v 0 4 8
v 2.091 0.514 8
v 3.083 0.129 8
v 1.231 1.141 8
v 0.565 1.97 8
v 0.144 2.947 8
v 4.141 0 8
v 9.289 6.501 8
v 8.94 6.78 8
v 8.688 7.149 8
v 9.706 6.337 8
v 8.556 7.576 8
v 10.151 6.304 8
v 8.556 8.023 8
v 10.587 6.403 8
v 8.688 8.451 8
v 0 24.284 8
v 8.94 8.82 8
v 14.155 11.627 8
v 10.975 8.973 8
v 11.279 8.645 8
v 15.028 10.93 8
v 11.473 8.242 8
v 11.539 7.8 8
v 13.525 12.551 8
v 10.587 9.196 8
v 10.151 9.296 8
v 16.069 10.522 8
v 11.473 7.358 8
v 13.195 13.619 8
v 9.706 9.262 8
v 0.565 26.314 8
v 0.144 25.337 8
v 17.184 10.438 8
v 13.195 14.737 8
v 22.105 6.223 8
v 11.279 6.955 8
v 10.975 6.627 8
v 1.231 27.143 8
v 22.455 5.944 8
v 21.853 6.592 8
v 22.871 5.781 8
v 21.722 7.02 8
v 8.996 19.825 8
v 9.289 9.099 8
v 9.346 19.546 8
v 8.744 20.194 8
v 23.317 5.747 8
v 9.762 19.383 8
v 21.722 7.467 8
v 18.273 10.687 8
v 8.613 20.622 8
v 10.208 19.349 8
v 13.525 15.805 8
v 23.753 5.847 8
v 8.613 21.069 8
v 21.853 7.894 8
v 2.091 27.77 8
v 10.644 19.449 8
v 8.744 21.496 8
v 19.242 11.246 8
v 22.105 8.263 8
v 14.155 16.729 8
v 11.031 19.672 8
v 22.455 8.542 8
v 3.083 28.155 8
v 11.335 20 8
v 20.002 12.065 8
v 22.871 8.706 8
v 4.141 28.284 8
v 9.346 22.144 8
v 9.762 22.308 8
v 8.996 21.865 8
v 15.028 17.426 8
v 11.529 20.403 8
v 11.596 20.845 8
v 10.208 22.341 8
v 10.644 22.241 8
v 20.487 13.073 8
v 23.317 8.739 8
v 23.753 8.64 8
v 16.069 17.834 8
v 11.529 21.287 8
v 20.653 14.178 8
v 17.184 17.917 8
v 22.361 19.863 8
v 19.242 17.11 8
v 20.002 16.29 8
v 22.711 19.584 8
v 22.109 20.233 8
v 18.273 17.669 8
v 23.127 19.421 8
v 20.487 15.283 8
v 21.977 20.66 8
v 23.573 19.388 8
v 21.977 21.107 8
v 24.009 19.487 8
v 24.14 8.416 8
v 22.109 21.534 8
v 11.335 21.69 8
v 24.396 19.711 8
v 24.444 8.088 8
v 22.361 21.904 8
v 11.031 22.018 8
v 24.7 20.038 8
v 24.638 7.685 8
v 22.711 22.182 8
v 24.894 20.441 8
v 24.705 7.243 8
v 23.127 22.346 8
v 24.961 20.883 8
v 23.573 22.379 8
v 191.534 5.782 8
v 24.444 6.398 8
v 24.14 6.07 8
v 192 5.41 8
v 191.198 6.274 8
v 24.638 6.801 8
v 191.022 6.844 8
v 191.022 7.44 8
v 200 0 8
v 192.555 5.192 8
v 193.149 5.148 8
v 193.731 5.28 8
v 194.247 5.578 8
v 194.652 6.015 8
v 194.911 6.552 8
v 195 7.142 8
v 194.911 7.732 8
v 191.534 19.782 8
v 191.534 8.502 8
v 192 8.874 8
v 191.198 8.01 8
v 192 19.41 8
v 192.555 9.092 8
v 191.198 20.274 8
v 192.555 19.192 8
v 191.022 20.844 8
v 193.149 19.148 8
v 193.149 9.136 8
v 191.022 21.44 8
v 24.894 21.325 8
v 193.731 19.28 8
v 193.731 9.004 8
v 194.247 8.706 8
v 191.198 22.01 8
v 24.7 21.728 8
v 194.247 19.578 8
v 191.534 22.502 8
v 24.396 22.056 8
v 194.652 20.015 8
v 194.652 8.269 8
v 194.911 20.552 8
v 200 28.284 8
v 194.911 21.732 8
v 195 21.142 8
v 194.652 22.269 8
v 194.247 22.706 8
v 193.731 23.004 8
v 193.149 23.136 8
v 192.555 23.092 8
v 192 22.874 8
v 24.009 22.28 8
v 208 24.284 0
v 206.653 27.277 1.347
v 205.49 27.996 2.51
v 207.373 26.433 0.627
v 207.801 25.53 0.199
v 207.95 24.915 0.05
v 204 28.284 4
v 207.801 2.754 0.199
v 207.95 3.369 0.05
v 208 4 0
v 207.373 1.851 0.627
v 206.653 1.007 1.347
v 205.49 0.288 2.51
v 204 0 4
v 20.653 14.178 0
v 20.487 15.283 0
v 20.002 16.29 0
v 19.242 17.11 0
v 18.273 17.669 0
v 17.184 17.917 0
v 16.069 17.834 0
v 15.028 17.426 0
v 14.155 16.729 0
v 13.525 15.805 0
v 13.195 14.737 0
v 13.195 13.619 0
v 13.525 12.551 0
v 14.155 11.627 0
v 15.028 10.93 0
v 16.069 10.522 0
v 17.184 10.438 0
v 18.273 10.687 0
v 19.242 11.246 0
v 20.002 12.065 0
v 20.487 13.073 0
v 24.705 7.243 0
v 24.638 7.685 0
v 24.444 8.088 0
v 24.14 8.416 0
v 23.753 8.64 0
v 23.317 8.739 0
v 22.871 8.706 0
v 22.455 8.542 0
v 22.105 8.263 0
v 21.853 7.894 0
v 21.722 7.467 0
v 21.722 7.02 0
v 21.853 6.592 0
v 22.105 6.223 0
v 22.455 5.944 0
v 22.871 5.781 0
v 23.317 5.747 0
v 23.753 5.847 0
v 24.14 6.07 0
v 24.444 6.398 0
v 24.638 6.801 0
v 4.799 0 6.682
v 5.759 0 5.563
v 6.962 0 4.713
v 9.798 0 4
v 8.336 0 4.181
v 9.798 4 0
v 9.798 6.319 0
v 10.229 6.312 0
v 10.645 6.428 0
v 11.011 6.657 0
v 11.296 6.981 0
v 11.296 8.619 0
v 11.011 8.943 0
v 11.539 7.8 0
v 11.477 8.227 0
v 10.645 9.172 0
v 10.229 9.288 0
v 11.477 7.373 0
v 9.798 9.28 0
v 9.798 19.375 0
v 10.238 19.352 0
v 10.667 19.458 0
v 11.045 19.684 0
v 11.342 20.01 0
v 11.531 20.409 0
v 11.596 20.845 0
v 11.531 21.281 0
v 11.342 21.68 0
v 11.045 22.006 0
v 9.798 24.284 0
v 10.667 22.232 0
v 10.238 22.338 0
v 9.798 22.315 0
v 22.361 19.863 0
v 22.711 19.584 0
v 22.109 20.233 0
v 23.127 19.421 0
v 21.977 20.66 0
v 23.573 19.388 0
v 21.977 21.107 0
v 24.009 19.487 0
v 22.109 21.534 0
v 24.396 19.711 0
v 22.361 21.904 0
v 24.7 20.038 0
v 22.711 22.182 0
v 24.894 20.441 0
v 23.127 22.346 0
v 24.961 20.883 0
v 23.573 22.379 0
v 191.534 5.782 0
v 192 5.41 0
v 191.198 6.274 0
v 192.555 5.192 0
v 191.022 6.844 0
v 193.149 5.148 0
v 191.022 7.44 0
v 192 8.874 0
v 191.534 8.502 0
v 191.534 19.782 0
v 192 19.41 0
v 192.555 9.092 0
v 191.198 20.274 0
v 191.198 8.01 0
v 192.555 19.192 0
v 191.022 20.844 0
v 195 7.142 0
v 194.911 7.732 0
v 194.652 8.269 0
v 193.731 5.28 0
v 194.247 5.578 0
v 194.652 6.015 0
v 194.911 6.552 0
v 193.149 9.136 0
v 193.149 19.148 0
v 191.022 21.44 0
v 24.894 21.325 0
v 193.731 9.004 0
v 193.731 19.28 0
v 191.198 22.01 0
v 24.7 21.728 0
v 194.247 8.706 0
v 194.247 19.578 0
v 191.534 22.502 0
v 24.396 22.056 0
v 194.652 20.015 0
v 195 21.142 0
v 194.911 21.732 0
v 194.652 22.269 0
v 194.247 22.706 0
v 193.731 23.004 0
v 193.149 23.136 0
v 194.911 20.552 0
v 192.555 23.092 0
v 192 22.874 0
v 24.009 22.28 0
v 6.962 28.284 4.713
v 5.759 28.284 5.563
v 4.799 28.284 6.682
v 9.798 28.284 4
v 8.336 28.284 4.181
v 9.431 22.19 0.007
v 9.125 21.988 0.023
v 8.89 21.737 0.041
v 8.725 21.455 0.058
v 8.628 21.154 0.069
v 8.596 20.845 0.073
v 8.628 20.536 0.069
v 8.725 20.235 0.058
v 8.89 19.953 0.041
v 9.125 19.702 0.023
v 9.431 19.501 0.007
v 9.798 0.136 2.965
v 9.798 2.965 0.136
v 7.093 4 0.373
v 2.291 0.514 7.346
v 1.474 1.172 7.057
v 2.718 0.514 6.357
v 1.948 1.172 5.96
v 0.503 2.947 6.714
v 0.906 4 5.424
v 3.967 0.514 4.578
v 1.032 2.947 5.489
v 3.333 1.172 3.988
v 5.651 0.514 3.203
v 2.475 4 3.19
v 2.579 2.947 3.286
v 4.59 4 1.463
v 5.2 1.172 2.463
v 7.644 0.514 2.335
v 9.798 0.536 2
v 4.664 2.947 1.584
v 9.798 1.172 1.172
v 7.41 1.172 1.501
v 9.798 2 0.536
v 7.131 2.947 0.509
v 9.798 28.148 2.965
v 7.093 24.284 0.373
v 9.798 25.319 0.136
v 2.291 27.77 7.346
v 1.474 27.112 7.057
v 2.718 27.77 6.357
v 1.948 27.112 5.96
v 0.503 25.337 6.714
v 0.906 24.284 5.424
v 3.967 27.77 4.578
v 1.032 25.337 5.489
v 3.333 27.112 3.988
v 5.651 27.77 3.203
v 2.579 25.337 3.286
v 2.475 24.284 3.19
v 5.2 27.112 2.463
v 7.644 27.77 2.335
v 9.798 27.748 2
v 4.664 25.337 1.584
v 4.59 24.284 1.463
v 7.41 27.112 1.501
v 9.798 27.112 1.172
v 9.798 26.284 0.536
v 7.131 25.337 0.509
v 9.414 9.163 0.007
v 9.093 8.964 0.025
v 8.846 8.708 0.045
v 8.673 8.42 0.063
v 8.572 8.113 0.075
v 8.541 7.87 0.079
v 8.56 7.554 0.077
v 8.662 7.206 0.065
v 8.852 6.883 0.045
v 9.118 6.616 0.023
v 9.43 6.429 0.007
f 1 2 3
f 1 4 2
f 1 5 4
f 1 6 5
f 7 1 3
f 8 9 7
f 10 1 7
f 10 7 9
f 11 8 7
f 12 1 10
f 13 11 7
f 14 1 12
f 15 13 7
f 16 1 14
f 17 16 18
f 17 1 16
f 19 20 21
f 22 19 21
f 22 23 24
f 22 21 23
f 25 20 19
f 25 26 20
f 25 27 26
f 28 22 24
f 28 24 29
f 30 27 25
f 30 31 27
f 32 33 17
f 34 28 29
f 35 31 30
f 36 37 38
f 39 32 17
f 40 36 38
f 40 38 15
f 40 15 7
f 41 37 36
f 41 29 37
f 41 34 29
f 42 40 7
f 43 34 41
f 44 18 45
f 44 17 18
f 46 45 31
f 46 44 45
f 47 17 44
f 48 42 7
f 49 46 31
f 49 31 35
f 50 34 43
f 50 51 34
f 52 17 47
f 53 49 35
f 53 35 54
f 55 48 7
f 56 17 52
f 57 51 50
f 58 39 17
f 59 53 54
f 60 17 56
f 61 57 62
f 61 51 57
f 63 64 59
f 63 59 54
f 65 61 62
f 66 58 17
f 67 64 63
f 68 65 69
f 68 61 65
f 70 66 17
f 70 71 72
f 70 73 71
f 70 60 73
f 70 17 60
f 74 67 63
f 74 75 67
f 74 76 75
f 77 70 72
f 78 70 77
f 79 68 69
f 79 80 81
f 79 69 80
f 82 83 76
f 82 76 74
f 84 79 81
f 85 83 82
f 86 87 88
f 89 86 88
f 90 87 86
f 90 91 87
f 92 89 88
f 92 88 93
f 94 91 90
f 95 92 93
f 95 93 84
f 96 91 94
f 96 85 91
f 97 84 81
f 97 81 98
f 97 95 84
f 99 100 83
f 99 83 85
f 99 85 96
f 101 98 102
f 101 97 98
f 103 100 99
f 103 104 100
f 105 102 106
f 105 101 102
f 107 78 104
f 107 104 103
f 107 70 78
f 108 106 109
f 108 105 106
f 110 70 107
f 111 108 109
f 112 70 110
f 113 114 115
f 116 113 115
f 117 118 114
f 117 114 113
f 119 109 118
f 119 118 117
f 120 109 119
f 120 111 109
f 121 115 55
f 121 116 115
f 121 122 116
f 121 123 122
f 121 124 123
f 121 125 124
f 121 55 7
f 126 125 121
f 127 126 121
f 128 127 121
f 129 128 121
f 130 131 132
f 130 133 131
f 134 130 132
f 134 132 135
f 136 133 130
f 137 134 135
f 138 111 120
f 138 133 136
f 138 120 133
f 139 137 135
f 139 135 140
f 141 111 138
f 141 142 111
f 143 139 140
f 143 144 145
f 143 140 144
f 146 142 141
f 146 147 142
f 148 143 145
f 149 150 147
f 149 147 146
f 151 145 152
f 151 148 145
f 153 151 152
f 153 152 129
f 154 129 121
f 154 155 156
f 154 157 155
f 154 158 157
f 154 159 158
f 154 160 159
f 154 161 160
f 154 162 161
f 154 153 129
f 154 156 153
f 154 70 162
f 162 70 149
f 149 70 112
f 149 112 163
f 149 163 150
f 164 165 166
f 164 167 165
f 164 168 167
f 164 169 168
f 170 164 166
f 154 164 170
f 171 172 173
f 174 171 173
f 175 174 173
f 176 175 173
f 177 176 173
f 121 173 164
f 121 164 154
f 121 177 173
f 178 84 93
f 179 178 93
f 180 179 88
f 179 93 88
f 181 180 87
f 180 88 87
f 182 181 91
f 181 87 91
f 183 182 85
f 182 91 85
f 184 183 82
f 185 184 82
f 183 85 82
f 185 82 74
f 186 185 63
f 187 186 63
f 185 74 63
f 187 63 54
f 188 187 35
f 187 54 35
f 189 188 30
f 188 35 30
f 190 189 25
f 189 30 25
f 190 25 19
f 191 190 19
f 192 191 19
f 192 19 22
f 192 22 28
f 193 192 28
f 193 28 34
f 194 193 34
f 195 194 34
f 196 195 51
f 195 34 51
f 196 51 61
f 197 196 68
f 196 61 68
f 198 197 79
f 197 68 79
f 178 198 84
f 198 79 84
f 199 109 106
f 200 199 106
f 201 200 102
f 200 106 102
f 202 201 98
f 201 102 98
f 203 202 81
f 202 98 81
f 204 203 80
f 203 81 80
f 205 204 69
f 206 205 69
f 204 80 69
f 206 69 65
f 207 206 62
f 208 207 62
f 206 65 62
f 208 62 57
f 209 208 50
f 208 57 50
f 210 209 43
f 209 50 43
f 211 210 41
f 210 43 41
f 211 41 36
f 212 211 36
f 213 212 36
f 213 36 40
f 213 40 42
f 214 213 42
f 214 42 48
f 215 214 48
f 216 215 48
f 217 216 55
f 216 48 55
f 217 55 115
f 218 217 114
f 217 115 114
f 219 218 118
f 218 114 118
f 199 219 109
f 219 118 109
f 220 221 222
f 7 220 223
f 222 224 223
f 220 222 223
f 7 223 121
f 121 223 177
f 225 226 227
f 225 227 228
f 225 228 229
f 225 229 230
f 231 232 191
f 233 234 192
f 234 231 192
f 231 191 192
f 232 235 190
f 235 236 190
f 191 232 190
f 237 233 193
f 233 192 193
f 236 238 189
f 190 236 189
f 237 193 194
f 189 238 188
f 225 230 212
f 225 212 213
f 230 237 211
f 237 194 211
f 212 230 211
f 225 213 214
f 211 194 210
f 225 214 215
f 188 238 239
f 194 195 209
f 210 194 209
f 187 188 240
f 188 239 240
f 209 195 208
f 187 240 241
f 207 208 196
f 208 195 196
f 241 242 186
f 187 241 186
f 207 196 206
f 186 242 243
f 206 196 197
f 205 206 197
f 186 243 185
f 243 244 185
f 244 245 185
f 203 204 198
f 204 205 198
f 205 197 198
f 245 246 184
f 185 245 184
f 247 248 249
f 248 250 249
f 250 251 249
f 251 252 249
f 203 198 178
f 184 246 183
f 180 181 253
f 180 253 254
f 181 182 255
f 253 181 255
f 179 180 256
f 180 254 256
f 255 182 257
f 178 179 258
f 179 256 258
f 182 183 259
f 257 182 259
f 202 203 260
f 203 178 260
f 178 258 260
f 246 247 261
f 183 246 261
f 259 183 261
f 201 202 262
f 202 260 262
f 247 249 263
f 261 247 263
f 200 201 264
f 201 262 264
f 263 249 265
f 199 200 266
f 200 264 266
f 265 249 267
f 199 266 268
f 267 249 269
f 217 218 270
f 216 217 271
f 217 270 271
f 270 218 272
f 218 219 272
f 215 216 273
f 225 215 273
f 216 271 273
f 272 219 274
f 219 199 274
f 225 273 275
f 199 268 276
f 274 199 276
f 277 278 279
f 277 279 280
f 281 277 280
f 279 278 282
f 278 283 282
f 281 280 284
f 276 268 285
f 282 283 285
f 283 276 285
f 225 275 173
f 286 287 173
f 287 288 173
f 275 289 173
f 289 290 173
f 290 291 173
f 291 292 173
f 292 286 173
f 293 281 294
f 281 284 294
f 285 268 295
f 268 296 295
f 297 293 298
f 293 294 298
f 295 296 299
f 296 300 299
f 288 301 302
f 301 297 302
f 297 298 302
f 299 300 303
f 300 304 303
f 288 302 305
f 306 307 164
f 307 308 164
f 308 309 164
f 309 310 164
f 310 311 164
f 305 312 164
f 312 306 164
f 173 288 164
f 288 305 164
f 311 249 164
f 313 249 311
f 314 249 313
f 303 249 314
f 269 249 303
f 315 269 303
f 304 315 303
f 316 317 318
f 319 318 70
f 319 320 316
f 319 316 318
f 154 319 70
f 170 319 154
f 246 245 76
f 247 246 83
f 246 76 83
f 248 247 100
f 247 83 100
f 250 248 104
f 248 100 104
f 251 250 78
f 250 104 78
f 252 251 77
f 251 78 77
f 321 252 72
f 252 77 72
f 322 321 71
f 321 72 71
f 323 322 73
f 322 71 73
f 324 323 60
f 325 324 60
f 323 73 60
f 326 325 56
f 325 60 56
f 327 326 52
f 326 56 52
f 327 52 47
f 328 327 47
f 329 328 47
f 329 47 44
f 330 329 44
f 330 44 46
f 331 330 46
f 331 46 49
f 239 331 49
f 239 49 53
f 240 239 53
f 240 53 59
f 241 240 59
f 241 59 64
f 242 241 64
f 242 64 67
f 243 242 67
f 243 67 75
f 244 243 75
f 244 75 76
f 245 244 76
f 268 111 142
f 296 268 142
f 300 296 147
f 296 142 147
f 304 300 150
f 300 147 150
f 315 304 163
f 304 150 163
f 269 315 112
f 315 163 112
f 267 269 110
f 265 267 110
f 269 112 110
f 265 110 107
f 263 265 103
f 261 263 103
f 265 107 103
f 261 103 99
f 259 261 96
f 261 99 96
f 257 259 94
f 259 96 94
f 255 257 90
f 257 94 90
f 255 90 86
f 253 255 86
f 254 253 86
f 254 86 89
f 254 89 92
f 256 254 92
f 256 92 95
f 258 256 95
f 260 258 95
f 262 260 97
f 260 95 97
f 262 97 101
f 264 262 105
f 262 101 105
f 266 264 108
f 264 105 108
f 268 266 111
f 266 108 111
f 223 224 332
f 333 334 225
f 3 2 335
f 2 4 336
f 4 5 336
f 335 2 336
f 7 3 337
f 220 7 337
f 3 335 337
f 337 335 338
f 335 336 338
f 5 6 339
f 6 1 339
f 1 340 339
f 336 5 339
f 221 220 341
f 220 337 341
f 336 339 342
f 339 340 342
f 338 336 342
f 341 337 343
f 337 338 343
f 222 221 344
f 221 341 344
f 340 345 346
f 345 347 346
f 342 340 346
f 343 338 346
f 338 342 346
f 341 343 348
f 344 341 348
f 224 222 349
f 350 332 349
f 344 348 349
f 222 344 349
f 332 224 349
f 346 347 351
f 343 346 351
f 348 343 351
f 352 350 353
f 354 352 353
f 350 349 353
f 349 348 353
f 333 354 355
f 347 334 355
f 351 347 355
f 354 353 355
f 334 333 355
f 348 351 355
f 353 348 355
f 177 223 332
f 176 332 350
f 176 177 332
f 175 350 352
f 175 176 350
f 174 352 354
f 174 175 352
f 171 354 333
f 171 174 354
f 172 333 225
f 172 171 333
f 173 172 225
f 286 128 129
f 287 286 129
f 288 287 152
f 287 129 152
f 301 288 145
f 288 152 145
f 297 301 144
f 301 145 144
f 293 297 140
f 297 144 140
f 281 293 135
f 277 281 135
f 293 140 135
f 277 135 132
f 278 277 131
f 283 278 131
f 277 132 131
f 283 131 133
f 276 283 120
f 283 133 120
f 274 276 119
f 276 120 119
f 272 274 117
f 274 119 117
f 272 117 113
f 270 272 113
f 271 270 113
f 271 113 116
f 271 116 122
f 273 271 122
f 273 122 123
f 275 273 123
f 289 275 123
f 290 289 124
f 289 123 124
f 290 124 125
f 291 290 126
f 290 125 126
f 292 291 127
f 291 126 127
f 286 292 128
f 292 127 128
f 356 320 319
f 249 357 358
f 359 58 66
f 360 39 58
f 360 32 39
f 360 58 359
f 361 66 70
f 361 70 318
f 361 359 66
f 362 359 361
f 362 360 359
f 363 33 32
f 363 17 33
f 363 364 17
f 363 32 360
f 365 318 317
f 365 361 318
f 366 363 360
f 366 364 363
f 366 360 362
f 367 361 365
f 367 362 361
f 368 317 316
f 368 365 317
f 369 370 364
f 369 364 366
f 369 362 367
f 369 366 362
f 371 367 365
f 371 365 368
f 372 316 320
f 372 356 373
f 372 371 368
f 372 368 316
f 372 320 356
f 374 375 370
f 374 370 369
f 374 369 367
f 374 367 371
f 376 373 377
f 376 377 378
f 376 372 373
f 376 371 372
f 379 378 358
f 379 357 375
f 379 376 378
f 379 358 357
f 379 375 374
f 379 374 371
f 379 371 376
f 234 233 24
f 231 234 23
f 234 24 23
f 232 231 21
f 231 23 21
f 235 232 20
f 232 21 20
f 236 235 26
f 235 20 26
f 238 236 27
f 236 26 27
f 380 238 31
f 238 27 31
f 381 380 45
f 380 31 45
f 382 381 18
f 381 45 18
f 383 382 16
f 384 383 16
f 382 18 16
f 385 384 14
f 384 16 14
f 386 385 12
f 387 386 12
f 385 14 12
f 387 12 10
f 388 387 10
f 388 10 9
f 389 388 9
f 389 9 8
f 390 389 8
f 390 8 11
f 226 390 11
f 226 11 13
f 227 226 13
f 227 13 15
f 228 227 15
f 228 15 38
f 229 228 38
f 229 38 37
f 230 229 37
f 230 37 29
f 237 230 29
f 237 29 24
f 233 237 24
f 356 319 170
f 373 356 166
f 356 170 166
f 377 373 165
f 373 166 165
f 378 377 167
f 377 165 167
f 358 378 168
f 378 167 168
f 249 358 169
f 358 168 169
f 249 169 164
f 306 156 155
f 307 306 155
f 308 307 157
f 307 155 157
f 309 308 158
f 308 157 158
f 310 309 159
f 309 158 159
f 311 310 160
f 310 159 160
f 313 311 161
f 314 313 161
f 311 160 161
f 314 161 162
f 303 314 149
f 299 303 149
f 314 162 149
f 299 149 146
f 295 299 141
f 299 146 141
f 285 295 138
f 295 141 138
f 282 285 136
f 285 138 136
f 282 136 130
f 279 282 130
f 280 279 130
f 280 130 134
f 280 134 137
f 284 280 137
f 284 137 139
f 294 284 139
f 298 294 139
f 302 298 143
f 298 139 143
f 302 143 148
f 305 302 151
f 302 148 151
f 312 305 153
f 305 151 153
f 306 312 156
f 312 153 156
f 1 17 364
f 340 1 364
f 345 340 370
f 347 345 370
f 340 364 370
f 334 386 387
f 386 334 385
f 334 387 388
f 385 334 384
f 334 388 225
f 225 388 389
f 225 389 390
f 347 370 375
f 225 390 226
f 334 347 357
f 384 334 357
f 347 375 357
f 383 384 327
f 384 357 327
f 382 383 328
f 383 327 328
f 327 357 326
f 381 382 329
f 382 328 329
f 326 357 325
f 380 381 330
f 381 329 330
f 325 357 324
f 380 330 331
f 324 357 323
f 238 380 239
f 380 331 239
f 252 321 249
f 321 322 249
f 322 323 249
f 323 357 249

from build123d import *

# Parameters (mm, degrees)
ESQUISSE1_W             = 220
ESQUISSE1_H             = 28.284
BOSS_EXTRU_3_DEPTH      = 8
CHANFREIN1_SIZE         = 20
ESQUISSE4_R             = 2
ENL_V_MAT_EXTRU_1_DEPTH = 8
FILLET1_R               = 10
SKETCH2_R               = 1.5
SKETCH2_R_2             = 3.75
CUT_EXTRUDE1_DEPTH      = 8
FILLET4_R               = 4
FILLET5_R               = 4


with BuildPart() as part:
    # Esquisse1 → Boss.-Extru.3 (new body)
    with BuildSketch(Plane.XY):
        with Locations((110, 14.142)):
            Rectangle(ESQUISSE1_W, ESQUISSE1_H)
    extrude(amount=BOSS_EXTRU_3_DEPTH)

    # Chanfrein1
    # the kernel refuses this chamfer: 20 mm, written as the material it takes off along each edge
    with BuildSketch(Plane(origin=(220, -51.433659759, 8), x_dir=(0.027495876610586317, 0, -0.9996219169112968), z_dir=(0, 1, 0))) as chanfrein1_piece_1:
        Polygon((CHANFREIN1_SIZE * 0.999621916911, CHANFREIN1_SIZE * 0.0274958766106), (-CHANFREIN1_SIZE * 0.0274958766106, CHANFREIN1_SIZE * 0.999621916911), (0, 0), align=None)
    extrude(amount=131.151319519, mode=Mode.SUBTRACT)

    # Esquisse4 → Enlèv. mat.-Extru.1 (cut)
    with BuildSketch(Plane.XY.offset(8)):
        with Locations((193, 7.142)):
            Circle(ESQUISSE4_R)
        with Locations((193, 21.142)):
            Circle(ESQUISSE4_R)
    extrude(amount=-ENL_V_MAT_EXTRU_1_DEPTH, mode=Mode.SUBTRACT)

    # Fillet1
    # the kernel refuses this fillet: 10 mm, written as the material it takes off along each edge
    with BuildSketch(Plane(origin=(0, 52.778897428, 0), x_dir=(1, 0, 0), z_dir=(0, -1, 0))) as fillet1_piece_1:
        with BuildLine():
            CenterArc((9.797958971, 10), FILLET1_R, 191.536959033, 78.463040967)
            Line((0, 8), (-0.195959179, 7.96))
            ThreePointArc((-0.195959179, 7.96), (-0.2, 4), (-0.2, 0))
            Line((-0.2, 0), (0, -0.2))
            Line((0, -0.2), (9.797958971, -0.2))
            Line((9.797958971, -0.2), (9.797958971, 0))
        make_face()
    extrude(amount=77.273794856, mode=Mode.SUBTRACT)

    # Sketch2 → Cut-Extrude1 (cut)
    with BuildSketch(Plane.XY.offset(8)):
        with Locations((10.039316358, 7.799790773)):
            Circle(SKETCH2_R)
        with Locations((10.095797266, 20.845111475)):
            Circle(SKETCH2_R)
        with Locations((23.204777475, 7.243195633)):
            Circle(SKETCH2_R)
        with Locations((23.460536656, 20.883346587)):
            Circle(SKETCH2_R)
        with Locations((16.903459812, 14.177912334)):
            Circle(SKETCH2_R_2)
    extrude(amount=-CUT_EXTRUDE1_DEPTH, mode=Mode.SUBTRACT)

    # Fillet4
    fillet4_edges = [part.edges().sort_by_distance(p)[0] for p in [
        (108.898979486, 0, 0),
        (3.473403651, 0, 2.254033308),
    ]]
    fillet(fillet4_edges, radius=FILLET4_R)

    # Fillet5
    fillet5_edges = [part.edges().sort_by_distance(p)[0] for p in [
        (108.898979486, 28.284, 0),
        (3.473403651, 28.284, 2.254033308),
    ]]
    fillet(fillet5_edges, radius=FILLET5_R)


solid = part.part
